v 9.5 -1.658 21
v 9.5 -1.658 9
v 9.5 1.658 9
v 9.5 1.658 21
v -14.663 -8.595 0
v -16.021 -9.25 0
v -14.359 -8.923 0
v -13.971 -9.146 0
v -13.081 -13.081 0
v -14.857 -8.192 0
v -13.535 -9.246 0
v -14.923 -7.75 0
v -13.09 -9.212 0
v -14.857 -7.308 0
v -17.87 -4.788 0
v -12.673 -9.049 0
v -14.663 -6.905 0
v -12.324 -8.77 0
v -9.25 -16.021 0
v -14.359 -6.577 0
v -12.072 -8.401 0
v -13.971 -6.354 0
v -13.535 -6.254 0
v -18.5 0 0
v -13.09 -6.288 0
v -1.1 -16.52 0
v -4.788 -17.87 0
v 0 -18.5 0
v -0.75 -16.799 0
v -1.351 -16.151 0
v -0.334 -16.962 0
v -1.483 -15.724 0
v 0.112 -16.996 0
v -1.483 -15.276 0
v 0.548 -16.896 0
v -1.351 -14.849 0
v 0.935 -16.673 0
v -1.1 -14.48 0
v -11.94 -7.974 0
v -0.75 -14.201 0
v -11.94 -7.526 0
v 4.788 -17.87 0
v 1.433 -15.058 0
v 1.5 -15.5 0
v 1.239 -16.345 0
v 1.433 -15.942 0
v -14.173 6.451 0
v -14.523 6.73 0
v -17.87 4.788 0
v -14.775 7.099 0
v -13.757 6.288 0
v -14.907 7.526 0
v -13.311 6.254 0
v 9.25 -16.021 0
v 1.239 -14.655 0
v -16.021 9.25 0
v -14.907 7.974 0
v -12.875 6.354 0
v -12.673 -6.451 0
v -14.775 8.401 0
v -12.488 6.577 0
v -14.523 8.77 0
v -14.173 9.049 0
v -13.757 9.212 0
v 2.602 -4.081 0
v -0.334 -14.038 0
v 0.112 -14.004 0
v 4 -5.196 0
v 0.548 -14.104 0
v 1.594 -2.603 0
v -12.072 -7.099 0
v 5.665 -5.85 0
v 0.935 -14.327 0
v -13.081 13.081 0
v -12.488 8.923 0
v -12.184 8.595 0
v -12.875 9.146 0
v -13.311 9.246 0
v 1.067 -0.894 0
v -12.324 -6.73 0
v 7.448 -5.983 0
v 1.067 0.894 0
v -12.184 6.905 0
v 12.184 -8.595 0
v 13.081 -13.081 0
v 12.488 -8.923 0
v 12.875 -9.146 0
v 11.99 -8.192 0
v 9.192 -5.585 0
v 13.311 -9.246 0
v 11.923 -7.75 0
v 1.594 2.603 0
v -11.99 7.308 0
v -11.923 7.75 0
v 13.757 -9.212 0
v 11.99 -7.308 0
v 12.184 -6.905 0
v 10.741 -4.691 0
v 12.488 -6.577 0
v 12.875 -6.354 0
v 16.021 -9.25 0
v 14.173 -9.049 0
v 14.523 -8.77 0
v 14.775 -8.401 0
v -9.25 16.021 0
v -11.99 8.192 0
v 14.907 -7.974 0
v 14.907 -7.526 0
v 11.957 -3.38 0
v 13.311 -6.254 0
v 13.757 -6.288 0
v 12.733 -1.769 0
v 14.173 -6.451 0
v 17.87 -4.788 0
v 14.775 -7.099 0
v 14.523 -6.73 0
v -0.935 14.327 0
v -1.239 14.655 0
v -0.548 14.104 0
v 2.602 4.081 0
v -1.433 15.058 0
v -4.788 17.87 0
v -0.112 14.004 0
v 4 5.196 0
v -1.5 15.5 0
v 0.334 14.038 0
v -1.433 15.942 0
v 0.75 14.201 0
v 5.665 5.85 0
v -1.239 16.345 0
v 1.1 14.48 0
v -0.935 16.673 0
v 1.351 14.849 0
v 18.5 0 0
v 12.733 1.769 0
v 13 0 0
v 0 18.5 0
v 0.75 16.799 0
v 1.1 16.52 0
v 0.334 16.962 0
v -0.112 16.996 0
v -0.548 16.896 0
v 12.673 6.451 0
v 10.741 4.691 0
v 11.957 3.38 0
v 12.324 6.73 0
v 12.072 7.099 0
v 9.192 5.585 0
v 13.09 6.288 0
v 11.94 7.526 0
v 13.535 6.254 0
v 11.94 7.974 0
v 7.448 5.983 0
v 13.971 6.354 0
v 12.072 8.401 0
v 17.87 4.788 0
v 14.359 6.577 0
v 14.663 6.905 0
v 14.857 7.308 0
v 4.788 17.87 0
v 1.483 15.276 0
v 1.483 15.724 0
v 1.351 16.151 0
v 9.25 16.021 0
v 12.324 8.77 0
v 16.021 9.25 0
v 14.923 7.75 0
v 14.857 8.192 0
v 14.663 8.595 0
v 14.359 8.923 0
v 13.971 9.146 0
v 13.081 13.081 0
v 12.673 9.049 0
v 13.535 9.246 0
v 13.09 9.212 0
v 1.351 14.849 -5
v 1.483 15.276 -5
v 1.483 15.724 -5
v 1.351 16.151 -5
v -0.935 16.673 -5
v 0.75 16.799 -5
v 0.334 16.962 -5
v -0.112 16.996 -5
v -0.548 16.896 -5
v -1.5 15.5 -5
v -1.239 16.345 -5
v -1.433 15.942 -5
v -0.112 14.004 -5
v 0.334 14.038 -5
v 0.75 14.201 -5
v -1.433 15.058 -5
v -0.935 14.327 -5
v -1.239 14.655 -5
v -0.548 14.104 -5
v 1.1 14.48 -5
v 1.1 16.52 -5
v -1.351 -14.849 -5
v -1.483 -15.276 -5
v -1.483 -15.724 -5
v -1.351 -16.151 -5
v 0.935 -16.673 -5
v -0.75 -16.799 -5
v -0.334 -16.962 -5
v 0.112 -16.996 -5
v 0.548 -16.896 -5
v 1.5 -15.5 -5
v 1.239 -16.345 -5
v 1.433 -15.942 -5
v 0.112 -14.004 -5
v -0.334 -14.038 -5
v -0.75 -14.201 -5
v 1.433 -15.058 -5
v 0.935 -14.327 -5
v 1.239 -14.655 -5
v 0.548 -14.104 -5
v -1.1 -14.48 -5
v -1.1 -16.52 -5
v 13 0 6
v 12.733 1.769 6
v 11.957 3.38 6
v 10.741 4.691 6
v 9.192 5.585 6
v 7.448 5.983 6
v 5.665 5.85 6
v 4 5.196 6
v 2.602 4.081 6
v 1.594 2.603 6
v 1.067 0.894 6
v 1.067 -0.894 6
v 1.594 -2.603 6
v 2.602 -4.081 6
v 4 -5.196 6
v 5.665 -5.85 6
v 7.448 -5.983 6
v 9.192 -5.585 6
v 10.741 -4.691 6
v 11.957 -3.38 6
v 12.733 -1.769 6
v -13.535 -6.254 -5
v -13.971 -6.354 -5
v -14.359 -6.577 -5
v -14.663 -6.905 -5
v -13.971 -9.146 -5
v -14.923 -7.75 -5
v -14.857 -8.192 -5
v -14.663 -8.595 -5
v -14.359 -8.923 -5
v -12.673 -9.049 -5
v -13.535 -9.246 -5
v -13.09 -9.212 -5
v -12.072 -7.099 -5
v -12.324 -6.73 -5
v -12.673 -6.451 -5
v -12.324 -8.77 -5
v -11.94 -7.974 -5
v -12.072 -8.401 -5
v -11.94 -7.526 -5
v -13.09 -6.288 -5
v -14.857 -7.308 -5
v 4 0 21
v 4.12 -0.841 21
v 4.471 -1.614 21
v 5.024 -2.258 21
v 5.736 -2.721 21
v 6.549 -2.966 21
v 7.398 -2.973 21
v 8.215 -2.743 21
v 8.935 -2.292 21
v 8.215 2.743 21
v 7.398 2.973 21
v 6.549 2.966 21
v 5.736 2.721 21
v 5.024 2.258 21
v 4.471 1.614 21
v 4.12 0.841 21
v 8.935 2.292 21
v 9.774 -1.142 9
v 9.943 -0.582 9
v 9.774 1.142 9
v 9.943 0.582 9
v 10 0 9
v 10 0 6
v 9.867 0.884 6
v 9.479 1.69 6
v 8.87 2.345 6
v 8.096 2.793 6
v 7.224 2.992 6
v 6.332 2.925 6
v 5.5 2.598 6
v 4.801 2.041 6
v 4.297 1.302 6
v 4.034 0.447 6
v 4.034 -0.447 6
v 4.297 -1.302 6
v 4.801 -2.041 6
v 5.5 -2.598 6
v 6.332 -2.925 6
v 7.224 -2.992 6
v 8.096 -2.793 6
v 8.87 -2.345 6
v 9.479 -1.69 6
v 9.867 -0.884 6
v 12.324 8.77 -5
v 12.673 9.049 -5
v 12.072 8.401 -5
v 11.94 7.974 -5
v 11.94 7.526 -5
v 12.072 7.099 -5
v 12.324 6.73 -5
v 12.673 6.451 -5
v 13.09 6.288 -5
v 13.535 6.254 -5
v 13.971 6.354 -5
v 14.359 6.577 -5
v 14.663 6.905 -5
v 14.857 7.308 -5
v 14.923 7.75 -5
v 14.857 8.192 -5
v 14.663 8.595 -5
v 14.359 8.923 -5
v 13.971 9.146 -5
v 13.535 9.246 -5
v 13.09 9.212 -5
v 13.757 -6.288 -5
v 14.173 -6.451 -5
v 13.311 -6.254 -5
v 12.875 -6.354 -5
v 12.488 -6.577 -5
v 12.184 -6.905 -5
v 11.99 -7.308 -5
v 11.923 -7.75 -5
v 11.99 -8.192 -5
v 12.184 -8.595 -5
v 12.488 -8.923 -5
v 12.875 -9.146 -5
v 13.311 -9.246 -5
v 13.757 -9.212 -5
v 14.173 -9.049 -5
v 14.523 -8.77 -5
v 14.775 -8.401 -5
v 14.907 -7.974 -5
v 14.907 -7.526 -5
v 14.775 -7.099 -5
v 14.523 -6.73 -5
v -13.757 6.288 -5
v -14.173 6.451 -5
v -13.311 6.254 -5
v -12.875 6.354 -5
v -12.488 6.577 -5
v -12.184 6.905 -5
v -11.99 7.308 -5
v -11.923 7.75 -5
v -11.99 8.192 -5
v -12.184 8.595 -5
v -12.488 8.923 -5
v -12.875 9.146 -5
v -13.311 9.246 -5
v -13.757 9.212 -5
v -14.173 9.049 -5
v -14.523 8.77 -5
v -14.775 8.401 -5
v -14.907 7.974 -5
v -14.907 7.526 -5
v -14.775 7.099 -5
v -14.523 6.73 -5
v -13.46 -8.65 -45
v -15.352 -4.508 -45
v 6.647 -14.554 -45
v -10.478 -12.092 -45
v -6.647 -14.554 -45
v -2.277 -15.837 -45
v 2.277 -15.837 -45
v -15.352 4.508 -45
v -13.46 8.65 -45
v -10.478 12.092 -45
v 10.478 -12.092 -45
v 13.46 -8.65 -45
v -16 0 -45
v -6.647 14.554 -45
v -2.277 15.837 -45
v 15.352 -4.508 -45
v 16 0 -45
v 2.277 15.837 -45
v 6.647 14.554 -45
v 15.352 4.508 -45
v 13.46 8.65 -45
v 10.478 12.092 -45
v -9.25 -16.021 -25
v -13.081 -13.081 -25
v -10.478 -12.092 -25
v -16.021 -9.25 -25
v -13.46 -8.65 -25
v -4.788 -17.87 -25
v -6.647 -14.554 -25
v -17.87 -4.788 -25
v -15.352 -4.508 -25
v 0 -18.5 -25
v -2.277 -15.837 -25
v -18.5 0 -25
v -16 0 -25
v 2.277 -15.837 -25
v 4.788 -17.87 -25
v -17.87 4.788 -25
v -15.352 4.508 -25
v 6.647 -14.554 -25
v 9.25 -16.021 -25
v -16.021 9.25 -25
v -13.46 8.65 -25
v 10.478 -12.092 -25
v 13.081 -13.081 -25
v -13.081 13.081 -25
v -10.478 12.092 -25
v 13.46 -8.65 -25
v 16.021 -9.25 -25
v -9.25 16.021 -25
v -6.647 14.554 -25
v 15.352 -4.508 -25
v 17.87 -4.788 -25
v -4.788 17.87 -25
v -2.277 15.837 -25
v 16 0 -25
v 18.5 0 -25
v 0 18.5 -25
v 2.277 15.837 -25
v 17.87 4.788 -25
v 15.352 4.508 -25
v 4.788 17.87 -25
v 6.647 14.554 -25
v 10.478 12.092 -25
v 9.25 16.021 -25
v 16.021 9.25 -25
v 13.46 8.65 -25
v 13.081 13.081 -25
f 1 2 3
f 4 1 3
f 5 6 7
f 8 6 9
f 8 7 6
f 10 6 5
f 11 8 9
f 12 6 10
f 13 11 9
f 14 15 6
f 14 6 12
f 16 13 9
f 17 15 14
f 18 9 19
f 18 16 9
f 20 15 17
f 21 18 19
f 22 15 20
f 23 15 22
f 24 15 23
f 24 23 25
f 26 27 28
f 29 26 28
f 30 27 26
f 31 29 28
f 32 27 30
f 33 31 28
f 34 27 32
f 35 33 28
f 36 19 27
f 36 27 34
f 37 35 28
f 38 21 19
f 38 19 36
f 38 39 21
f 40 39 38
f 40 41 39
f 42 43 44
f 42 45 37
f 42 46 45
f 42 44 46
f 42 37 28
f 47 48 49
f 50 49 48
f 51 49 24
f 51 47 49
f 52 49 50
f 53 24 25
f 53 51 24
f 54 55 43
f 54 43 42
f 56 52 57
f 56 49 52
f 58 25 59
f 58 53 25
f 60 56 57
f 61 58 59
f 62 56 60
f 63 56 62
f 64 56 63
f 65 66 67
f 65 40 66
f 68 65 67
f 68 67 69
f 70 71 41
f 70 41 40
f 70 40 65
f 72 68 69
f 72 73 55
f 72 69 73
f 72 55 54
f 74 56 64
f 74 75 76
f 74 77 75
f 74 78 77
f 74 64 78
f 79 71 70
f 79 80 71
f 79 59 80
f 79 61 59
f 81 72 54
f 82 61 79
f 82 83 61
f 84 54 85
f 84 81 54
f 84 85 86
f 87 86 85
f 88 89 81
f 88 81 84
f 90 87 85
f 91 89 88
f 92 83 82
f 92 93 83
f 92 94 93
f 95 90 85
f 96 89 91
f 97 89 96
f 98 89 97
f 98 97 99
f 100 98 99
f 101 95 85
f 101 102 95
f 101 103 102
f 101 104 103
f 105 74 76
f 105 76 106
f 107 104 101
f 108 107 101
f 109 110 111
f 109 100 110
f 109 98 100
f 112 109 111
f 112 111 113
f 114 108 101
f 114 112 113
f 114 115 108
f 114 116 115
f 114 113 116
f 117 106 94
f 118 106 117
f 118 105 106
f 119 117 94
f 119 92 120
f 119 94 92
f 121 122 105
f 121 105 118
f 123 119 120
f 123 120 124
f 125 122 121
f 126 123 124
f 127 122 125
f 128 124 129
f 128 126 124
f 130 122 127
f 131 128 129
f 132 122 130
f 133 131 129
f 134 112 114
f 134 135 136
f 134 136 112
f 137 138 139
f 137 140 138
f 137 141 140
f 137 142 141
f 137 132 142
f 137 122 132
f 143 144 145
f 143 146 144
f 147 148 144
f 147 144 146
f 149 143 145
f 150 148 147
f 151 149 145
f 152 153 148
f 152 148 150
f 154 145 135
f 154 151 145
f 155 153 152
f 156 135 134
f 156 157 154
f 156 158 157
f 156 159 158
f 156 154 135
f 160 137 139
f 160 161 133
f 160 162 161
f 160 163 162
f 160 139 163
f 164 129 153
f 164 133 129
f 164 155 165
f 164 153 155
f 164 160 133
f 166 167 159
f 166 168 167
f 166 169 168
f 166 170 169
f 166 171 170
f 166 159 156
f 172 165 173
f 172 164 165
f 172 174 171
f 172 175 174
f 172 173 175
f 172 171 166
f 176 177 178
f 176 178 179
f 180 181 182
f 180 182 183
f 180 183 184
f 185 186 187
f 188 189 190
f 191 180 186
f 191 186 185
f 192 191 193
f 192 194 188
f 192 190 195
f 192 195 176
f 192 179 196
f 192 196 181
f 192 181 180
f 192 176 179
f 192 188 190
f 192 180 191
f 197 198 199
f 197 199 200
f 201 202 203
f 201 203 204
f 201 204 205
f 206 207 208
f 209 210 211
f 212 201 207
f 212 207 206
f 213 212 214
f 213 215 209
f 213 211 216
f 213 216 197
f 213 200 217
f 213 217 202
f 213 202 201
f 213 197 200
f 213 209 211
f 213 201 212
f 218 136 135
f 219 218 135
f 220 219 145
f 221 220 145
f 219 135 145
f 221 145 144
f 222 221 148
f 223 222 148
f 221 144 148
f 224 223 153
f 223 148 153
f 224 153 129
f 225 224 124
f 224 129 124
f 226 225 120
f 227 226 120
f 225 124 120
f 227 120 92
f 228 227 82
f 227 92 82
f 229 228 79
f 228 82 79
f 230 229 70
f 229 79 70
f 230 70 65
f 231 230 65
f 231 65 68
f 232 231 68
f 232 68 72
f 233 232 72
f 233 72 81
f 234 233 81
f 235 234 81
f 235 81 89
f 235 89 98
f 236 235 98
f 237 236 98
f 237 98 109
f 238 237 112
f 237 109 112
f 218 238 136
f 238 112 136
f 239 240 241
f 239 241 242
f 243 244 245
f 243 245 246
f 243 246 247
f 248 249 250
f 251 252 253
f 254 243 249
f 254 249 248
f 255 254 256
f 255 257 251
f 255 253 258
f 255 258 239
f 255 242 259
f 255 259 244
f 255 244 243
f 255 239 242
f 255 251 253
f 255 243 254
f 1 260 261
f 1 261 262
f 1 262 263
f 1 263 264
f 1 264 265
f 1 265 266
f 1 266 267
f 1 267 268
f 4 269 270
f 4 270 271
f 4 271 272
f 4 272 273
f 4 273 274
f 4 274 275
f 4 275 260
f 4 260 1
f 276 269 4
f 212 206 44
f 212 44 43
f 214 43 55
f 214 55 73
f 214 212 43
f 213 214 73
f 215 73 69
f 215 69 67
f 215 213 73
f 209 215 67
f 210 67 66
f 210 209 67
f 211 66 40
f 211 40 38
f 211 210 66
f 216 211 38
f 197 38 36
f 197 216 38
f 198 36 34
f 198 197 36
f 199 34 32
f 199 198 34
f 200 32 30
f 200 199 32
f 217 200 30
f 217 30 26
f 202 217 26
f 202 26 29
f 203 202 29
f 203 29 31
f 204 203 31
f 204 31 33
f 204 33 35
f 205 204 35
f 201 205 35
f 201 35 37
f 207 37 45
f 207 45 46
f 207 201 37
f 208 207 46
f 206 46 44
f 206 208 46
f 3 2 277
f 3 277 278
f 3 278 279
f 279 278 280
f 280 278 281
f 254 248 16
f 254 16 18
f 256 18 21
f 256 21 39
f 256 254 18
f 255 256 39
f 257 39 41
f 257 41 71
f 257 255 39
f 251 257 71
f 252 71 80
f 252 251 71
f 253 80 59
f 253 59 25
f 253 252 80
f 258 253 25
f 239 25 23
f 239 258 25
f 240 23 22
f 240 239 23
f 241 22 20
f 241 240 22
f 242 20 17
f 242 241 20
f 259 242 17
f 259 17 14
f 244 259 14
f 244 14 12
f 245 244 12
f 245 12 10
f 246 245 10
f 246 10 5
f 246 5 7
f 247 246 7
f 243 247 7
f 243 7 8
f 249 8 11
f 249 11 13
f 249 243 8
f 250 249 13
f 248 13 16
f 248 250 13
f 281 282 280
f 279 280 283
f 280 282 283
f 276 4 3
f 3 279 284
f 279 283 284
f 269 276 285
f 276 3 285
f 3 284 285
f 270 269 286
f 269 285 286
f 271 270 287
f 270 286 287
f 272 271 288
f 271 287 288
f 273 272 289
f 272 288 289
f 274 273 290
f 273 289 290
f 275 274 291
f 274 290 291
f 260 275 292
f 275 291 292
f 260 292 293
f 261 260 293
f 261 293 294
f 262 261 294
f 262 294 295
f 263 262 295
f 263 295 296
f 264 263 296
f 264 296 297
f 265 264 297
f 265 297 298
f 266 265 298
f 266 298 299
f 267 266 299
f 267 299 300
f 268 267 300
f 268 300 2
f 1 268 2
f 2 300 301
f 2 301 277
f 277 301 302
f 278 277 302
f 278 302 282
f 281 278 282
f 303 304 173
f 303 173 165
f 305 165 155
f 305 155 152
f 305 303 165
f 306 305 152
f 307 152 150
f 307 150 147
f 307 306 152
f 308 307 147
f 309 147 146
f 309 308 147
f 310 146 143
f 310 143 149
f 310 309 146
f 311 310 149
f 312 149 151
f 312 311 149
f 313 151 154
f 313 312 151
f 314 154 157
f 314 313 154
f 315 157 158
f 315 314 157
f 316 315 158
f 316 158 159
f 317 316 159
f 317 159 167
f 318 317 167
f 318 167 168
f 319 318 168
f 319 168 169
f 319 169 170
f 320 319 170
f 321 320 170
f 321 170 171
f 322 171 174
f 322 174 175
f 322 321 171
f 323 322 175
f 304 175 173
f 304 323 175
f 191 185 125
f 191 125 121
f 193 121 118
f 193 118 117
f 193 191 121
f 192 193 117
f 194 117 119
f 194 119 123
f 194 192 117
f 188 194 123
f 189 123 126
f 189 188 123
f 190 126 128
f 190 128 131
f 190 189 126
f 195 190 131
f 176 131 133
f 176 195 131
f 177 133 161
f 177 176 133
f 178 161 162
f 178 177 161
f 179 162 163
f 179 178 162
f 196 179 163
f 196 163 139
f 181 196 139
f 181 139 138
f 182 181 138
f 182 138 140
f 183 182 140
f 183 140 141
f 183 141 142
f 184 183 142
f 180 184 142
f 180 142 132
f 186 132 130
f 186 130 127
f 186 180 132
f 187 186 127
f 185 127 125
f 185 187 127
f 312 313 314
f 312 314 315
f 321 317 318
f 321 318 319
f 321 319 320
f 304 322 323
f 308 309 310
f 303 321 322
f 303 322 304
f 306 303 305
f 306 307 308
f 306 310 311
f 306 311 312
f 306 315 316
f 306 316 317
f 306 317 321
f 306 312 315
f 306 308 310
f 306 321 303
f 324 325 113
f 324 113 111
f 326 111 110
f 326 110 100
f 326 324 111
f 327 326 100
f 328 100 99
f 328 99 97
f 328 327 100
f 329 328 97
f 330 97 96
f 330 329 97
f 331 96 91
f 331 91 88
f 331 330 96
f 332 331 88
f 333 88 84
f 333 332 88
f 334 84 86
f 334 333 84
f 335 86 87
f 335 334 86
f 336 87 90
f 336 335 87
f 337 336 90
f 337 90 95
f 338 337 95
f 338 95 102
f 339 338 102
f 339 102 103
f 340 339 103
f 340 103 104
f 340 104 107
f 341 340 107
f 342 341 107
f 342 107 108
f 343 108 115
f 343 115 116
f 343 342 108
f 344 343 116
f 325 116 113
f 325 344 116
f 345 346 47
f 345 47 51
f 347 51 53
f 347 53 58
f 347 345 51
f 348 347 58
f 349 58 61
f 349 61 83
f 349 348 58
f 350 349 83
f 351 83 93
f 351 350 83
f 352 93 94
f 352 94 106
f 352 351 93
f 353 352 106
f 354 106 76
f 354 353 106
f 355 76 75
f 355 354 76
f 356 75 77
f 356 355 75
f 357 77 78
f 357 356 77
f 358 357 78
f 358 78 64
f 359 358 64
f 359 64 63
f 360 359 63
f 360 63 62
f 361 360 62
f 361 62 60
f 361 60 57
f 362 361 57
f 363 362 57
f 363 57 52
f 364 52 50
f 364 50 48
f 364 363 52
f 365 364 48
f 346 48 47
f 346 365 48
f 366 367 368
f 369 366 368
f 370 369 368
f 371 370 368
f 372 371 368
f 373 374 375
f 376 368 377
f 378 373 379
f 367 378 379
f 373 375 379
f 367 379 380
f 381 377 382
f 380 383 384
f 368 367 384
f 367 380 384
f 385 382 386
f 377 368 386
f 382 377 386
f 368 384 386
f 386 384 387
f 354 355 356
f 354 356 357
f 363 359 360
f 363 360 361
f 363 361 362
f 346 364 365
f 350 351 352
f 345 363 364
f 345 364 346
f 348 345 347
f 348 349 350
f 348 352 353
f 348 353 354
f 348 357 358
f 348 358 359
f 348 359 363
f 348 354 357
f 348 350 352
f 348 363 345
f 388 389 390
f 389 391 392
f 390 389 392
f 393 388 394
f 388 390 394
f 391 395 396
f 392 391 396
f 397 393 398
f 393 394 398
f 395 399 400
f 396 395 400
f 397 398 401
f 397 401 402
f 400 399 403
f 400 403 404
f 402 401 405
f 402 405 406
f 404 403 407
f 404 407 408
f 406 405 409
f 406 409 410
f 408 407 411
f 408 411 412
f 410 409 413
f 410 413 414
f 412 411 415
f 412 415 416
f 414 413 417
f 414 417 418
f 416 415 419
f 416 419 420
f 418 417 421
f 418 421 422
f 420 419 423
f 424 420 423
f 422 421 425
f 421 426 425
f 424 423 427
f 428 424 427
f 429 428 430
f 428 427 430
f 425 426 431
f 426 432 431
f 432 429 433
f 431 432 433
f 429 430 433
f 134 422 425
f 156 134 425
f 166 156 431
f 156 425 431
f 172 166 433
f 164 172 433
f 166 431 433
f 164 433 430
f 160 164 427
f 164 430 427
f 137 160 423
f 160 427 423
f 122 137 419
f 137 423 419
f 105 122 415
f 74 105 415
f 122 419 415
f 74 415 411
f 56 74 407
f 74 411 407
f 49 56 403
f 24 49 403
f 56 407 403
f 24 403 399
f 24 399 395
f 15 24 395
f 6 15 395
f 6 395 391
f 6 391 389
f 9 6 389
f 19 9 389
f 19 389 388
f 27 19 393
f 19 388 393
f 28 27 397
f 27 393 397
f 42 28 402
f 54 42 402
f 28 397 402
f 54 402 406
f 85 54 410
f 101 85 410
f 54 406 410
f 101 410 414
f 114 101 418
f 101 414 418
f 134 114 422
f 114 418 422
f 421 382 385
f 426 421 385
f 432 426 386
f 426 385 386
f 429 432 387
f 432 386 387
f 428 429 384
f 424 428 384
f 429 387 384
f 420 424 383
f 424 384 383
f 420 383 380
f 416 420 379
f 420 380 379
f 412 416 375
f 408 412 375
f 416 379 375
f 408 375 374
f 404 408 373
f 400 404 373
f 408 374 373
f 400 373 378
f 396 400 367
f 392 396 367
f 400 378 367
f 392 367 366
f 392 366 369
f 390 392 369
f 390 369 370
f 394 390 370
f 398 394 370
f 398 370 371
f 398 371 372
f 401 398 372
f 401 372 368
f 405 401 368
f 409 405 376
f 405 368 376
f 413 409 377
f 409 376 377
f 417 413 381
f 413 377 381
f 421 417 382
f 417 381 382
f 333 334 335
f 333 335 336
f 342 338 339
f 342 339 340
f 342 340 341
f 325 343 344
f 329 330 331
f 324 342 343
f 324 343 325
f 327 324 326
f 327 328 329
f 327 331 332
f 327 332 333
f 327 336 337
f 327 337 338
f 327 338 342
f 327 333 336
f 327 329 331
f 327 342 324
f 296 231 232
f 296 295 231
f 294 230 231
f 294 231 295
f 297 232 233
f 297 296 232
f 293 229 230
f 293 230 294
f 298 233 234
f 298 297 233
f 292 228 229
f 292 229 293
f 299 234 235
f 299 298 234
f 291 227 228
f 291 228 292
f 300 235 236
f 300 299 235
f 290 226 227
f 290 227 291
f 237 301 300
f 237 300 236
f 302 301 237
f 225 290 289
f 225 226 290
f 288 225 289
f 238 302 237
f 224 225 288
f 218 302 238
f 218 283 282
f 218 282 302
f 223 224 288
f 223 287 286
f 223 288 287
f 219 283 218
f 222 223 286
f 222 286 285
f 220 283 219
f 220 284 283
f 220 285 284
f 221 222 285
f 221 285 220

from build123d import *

# Parameters (mm, degrees)
BOX_W             = 10
BOX_H             = 10
BOX_DEPTH         = 12
CYLINDER004_R     = 1.5
CYLINDER004_DEPTH = 5
ARRAY_COUNT       = 6
CYLINDER001_R     = 18.5
CYLINDER001_DEPTH = 25
CYLINDER002_R     = 6
CYLINDER002_DEPTH = 6
CYLINDER003_R     = 3
CYLINDER003_DEPTH = 15
CYLINDER_R        = 16
CYLINDER_DEPTH    = 20


with BuildPart() as shaft_d_cut_out:
    # Box → Box (new body)
    with BuildSketch(Plane(origin=(9.5, -5, 9), x_dir=(1, 0, 0), z_dir=(0, 0, 1))):
        with Locations((5, 5)):
            Rectangle(BOX_W, BOX_H)
    extrude(amount=BOX_DEPTH)


with BuildPart() as negative_fusion:
    # Cylinder004 → Cylinder004 (new body)
    with BuildSketch(Plane(origin=(0, -15.5, -5), x_dir=(1, 0, 0), z_dir=(0, 0, 1))):
        Circle(CYLINDER004_R)
    extrude(amount=CYLINDER004_DEPTH)

    # Array: Negative Fusion ×6 about axis
    array_axis = Axis((0, 0, 0), (0, 0, 1))


with BuildPart() as negative_fusion_1:
    add(negative_fusion.part)
    for i in range(1, ARRAY_COUNT):
        add(negative_fusion.part.rotate(array_axis, i * 360 / ARRAY_COUNT))

    # Fusion: union Shaft D Cut Out
    add(shaft_d_cut_out.part)


with BuildPart() as gear_box:
    # Cylinder001 → Cylinder001 (new body)
    with BuildSketch(Plane.XY.offset(-25)):
        Circle(CYLINDER001_R)
    extrude(amount=CYLINDER001_DEPTH)


with BuildPart() as shaft_flange:
    # Cylinder002 → Cylinder002 (new body)
    with BuildSketch(Plane(origin=(7, 0, 0), x_dir=(1, 0, 0), z_dir=(0, 0, 1))):
        Circle(CYLINDER002_R)
    extrude(amount=CYLINDER002_DEPTH)


with BuildPart() as shaft:
    # Cylinder003 → Cylinder003 (new body)
    with BuildSketch(Plane(origin=(7, 0, 6), x_dir=(1, 0, 0), z_dir=(0, 0, 1))):
        Circle(CYLINDER003_R)
    extrude(amount=CYLINDER003_DEPTH)


with BuildPart() as dc_gear_motor_37mm:
    # Cylinder → Cylinder (new body)
    with BuildSketch(Plane.XY.offset(-45)):
        Circle(CYLINDER_R)
    extrude(amount=CYLINDER_DEPTH)

    # Fusion001: union Gear Box, Shaft Flange, Shaft
    add(gear_box.part)
    add(shaft_flange.part)
    add(shaft.part)

    # Cut: cut Negative Fusion
    add(negative_fusion_1.part, mode=Mode.SUBTRACT)


solid = dc_gear_motor_37mm.part
